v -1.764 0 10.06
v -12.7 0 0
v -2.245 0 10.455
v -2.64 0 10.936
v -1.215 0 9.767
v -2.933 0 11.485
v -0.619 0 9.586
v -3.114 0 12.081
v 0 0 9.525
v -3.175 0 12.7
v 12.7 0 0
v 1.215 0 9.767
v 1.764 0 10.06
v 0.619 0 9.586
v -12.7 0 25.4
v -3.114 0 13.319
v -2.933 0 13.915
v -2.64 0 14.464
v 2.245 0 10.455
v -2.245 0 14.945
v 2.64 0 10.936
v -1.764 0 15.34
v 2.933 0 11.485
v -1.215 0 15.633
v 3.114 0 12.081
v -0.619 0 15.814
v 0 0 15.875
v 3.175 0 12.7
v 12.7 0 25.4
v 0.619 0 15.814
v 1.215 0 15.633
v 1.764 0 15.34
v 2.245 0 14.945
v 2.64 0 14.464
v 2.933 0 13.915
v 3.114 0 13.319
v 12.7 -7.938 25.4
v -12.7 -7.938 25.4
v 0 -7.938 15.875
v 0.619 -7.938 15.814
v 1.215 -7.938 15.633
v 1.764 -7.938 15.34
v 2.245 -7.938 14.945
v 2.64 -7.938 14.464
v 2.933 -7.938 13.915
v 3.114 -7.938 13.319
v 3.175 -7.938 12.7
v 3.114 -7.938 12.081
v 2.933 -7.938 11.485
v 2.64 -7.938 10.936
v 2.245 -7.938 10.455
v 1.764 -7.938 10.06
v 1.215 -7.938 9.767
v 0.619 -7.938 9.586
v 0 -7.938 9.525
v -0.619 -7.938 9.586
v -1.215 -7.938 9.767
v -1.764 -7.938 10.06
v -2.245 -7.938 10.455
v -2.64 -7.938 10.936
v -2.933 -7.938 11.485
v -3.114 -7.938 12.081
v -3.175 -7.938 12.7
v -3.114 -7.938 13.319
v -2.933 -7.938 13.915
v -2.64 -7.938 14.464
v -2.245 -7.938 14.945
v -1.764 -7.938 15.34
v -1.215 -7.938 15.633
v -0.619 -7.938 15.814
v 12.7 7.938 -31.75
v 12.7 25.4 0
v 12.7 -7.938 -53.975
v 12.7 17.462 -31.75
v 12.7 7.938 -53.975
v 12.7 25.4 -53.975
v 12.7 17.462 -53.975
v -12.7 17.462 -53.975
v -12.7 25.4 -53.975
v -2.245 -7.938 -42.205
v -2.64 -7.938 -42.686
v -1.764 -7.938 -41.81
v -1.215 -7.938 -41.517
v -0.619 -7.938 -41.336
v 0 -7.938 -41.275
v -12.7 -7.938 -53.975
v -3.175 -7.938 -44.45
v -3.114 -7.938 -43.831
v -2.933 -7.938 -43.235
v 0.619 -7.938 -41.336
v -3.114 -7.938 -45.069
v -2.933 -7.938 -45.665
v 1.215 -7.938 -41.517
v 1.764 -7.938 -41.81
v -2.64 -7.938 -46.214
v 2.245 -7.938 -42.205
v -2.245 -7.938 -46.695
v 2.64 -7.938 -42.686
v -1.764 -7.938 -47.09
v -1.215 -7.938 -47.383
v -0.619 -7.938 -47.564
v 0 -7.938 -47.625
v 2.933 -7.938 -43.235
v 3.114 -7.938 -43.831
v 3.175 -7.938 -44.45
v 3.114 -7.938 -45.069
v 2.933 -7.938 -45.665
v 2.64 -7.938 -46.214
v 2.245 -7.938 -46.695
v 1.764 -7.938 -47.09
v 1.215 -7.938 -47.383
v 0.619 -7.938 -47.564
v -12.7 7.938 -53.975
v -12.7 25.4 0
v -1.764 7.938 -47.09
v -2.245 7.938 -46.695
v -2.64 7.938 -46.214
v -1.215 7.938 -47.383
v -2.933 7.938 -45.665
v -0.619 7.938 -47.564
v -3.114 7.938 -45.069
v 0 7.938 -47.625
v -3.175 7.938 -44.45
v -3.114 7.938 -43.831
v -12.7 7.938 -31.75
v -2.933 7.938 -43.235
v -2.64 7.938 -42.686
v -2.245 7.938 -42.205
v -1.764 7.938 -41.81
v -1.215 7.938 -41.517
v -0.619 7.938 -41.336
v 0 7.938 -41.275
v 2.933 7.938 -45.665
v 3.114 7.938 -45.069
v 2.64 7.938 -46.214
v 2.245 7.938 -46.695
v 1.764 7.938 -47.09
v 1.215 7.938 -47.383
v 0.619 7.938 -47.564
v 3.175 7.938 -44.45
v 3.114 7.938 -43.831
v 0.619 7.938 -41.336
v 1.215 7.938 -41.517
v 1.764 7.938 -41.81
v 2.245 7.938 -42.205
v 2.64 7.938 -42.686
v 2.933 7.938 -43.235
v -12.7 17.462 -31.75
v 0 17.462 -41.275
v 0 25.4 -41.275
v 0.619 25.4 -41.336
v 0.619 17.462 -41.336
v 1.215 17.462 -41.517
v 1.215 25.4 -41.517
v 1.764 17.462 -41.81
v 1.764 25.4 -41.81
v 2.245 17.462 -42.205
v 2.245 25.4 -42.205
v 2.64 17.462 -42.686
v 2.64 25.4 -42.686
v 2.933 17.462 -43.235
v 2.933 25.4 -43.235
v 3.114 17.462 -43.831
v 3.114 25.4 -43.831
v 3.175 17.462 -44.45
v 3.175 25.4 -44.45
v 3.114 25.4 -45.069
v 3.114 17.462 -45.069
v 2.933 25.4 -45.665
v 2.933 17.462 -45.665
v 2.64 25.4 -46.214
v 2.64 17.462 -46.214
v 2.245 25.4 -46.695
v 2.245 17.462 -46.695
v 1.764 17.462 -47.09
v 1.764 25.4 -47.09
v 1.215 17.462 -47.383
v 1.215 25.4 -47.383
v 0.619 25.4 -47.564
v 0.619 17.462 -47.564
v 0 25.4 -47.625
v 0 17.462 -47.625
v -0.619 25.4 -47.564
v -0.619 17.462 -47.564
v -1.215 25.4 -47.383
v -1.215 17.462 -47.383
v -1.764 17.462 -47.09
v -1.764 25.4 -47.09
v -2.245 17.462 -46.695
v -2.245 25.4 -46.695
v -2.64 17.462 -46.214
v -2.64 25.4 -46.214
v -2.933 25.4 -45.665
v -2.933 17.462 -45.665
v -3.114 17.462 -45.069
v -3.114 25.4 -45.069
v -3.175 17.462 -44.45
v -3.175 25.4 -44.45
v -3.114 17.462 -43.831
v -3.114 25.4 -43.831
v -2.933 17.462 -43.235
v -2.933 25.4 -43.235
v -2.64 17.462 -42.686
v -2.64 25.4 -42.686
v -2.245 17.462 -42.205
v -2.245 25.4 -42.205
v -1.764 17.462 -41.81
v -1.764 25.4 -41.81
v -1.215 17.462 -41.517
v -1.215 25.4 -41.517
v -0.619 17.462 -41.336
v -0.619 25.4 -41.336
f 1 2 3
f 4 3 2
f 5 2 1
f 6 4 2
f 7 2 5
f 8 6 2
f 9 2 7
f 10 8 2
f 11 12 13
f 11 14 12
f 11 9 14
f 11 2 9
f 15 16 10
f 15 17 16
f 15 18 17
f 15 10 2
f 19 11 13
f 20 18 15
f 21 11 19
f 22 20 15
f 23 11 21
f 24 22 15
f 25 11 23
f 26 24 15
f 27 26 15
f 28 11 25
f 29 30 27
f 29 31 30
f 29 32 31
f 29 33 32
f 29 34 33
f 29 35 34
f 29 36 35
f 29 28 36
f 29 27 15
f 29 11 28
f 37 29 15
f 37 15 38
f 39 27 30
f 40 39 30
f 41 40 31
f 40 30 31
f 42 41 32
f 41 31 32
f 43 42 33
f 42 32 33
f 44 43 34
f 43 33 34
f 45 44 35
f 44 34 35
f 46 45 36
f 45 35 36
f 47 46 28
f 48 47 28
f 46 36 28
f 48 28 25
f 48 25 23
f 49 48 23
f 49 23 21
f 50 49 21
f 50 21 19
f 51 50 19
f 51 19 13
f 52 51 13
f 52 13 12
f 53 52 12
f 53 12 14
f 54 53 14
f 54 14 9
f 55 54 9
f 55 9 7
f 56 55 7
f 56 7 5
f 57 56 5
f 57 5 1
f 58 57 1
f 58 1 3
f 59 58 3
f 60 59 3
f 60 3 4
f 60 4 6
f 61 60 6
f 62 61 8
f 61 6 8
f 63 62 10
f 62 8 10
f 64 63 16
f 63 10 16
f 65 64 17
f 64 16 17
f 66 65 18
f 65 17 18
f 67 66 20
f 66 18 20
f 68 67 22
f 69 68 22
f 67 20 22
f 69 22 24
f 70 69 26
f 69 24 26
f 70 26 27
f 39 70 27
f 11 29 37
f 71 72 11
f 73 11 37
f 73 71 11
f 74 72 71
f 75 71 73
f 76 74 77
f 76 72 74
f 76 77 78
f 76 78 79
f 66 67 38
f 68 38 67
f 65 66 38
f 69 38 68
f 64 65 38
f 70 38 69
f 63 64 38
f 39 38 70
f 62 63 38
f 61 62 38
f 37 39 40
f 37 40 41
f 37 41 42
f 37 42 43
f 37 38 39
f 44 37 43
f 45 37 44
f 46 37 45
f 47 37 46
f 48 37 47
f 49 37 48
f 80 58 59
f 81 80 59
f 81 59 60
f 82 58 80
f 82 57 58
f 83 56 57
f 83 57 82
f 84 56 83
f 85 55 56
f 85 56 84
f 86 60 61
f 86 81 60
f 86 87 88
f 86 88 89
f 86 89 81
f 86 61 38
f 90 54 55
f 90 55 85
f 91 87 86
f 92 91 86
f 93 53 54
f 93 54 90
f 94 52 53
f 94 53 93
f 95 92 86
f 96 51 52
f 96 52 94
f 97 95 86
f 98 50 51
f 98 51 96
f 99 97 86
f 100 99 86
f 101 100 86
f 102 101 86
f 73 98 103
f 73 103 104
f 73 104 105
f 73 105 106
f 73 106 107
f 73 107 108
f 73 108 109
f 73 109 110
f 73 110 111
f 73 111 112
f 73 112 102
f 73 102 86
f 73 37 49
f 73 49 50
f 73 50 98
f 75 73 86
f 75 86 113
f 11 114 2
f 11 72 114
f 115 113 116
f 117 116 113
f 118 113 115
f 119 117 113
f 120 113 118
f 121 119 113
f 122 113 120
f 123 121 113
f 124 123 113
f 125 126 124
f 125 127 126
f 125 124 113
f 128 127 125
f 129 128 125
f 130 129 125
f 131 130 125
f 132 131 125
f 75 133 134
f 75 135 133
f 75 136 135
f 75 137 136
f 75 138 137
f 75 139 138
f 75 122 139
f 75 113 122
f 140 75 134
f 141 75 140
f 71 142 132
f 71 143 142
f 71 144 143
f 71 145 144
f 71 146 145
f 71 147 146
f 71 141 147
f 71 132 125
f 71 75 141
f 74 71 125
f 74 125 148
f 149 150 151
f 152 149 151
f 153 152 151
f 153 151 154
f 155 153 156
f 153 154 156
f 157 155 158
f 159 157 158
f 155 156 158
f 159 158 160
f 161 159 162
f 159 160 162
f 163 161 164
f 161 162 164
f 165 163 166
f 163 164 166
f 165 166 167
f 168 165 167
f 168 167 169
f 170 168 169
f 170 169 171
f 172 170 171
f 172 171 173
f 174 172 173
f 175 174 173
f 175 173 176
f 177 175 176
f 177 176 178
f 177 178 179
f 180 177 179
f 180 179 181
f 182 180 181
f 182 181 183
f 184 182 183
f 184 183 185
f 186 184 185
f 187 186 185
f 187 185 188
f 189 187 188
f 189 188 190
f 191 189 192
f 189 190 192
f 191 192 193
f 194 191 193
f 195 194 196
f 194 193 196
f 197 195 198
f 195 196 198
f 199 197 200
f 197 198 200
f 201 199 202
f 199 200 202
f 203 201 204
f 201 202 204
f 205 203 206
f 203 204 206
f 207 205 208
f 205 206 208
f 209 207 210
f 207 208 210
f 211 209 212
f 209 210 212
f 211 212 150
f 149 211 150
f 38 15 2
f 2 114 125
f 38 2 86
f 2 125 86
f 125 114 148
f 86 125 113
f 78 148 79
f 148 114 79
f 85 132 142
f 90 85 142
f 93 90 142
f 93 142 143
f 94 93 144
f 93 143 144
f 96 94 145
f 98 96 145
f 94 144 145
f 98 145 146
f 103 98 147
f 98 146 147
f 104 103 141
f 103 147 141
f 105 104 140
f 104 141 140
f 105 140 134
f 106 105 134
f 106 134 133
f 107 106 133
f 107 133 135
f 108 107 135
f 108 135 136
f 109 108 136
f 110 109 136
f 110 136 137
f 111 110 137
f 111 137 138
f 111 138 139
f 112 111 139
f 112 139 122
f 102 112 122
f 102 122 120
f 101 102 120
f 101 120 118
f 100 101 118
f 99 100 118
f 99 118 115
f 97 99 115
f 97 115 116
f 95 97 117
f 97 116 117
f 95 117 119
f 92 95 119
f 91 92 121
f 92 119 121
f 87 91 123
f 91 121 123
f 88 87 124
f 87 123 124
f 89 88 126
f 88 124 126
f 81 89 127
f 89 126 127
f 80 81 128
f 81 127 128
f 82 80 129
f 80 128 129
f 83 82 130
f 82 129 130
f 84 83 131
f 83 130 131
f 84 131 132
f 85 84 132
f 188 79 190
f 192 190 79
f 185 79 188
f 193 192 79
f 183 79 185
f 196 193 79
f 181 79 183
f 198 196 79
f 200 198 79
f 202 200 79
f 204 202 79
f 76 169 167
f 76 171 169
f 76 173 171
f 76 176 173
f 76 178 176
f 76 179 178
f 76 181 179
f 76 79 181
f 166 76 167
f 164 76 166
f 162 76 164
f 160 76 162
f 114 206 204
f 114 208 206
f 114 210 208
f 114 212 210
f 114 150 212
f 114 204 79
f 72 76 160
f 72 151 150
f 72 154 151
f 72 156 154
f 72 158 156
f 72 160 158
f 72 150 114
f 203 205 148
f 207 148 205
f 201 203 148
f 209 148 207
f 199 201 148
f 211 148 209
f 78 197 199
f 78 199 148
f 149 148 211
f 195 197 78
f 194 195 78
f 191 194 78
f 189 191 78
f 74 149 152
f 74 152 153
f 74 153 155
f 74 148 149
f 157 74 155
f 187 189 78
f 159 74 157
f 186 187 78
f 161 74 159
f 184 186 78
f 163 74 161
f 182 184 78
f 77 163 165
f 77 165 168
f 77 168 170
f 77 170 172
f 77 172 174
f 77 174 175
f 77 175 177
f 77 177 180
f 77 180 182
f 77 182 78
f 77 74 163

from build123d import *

# Parameters (mm, degrees)
BOSS_EXTRUDE1_DEPTH = 12.7
SKETCH2_R           = 3.175
CUT_EXTRUDE1_DEPTH  = 65.699146295


with BuildPart() as part:
    # Sketch1 → Boss-Extrude1 (new, symmetric)
    with BuildSketch(Plane(origin=(0, 0, 0), x_dir=(0, 0, -1), z_dir=(1, 0, 0))):
        Polygon((0, 0), (-25.4, 0), (-25.4, -7.9375), (53.975, -7.9375), (53.975, 7.9375), (31.75, 7.9375), (31.75, 17.4625), (53.975, 17.4625), (53.975, 25.4), (0, 25.4), align=None)
    extrude(amount=BOSS_EXTRUDE1_DEPTH, both=True)

    # Sketch2 → Cut-Extrude1 (cut, through all)
    with BuildSketch(Plane(origin=(0, 25.4, 0), x_dir=(1, 0, 0), z_dir=(0, 1, 0))):
        with Locations(Location((0, 44.45, 0), (0, 0, 270))):
            Circle(SKETCH2_R)
        with Locations(Location((0, -12.7, 0), (0, 0, 270))):
            Circle(SKETCH2_R)
    extrude(amount=-CUT_EXTRUDE1_DEPTH, mode=Mode.SUBTRACT)


solid = part.part
